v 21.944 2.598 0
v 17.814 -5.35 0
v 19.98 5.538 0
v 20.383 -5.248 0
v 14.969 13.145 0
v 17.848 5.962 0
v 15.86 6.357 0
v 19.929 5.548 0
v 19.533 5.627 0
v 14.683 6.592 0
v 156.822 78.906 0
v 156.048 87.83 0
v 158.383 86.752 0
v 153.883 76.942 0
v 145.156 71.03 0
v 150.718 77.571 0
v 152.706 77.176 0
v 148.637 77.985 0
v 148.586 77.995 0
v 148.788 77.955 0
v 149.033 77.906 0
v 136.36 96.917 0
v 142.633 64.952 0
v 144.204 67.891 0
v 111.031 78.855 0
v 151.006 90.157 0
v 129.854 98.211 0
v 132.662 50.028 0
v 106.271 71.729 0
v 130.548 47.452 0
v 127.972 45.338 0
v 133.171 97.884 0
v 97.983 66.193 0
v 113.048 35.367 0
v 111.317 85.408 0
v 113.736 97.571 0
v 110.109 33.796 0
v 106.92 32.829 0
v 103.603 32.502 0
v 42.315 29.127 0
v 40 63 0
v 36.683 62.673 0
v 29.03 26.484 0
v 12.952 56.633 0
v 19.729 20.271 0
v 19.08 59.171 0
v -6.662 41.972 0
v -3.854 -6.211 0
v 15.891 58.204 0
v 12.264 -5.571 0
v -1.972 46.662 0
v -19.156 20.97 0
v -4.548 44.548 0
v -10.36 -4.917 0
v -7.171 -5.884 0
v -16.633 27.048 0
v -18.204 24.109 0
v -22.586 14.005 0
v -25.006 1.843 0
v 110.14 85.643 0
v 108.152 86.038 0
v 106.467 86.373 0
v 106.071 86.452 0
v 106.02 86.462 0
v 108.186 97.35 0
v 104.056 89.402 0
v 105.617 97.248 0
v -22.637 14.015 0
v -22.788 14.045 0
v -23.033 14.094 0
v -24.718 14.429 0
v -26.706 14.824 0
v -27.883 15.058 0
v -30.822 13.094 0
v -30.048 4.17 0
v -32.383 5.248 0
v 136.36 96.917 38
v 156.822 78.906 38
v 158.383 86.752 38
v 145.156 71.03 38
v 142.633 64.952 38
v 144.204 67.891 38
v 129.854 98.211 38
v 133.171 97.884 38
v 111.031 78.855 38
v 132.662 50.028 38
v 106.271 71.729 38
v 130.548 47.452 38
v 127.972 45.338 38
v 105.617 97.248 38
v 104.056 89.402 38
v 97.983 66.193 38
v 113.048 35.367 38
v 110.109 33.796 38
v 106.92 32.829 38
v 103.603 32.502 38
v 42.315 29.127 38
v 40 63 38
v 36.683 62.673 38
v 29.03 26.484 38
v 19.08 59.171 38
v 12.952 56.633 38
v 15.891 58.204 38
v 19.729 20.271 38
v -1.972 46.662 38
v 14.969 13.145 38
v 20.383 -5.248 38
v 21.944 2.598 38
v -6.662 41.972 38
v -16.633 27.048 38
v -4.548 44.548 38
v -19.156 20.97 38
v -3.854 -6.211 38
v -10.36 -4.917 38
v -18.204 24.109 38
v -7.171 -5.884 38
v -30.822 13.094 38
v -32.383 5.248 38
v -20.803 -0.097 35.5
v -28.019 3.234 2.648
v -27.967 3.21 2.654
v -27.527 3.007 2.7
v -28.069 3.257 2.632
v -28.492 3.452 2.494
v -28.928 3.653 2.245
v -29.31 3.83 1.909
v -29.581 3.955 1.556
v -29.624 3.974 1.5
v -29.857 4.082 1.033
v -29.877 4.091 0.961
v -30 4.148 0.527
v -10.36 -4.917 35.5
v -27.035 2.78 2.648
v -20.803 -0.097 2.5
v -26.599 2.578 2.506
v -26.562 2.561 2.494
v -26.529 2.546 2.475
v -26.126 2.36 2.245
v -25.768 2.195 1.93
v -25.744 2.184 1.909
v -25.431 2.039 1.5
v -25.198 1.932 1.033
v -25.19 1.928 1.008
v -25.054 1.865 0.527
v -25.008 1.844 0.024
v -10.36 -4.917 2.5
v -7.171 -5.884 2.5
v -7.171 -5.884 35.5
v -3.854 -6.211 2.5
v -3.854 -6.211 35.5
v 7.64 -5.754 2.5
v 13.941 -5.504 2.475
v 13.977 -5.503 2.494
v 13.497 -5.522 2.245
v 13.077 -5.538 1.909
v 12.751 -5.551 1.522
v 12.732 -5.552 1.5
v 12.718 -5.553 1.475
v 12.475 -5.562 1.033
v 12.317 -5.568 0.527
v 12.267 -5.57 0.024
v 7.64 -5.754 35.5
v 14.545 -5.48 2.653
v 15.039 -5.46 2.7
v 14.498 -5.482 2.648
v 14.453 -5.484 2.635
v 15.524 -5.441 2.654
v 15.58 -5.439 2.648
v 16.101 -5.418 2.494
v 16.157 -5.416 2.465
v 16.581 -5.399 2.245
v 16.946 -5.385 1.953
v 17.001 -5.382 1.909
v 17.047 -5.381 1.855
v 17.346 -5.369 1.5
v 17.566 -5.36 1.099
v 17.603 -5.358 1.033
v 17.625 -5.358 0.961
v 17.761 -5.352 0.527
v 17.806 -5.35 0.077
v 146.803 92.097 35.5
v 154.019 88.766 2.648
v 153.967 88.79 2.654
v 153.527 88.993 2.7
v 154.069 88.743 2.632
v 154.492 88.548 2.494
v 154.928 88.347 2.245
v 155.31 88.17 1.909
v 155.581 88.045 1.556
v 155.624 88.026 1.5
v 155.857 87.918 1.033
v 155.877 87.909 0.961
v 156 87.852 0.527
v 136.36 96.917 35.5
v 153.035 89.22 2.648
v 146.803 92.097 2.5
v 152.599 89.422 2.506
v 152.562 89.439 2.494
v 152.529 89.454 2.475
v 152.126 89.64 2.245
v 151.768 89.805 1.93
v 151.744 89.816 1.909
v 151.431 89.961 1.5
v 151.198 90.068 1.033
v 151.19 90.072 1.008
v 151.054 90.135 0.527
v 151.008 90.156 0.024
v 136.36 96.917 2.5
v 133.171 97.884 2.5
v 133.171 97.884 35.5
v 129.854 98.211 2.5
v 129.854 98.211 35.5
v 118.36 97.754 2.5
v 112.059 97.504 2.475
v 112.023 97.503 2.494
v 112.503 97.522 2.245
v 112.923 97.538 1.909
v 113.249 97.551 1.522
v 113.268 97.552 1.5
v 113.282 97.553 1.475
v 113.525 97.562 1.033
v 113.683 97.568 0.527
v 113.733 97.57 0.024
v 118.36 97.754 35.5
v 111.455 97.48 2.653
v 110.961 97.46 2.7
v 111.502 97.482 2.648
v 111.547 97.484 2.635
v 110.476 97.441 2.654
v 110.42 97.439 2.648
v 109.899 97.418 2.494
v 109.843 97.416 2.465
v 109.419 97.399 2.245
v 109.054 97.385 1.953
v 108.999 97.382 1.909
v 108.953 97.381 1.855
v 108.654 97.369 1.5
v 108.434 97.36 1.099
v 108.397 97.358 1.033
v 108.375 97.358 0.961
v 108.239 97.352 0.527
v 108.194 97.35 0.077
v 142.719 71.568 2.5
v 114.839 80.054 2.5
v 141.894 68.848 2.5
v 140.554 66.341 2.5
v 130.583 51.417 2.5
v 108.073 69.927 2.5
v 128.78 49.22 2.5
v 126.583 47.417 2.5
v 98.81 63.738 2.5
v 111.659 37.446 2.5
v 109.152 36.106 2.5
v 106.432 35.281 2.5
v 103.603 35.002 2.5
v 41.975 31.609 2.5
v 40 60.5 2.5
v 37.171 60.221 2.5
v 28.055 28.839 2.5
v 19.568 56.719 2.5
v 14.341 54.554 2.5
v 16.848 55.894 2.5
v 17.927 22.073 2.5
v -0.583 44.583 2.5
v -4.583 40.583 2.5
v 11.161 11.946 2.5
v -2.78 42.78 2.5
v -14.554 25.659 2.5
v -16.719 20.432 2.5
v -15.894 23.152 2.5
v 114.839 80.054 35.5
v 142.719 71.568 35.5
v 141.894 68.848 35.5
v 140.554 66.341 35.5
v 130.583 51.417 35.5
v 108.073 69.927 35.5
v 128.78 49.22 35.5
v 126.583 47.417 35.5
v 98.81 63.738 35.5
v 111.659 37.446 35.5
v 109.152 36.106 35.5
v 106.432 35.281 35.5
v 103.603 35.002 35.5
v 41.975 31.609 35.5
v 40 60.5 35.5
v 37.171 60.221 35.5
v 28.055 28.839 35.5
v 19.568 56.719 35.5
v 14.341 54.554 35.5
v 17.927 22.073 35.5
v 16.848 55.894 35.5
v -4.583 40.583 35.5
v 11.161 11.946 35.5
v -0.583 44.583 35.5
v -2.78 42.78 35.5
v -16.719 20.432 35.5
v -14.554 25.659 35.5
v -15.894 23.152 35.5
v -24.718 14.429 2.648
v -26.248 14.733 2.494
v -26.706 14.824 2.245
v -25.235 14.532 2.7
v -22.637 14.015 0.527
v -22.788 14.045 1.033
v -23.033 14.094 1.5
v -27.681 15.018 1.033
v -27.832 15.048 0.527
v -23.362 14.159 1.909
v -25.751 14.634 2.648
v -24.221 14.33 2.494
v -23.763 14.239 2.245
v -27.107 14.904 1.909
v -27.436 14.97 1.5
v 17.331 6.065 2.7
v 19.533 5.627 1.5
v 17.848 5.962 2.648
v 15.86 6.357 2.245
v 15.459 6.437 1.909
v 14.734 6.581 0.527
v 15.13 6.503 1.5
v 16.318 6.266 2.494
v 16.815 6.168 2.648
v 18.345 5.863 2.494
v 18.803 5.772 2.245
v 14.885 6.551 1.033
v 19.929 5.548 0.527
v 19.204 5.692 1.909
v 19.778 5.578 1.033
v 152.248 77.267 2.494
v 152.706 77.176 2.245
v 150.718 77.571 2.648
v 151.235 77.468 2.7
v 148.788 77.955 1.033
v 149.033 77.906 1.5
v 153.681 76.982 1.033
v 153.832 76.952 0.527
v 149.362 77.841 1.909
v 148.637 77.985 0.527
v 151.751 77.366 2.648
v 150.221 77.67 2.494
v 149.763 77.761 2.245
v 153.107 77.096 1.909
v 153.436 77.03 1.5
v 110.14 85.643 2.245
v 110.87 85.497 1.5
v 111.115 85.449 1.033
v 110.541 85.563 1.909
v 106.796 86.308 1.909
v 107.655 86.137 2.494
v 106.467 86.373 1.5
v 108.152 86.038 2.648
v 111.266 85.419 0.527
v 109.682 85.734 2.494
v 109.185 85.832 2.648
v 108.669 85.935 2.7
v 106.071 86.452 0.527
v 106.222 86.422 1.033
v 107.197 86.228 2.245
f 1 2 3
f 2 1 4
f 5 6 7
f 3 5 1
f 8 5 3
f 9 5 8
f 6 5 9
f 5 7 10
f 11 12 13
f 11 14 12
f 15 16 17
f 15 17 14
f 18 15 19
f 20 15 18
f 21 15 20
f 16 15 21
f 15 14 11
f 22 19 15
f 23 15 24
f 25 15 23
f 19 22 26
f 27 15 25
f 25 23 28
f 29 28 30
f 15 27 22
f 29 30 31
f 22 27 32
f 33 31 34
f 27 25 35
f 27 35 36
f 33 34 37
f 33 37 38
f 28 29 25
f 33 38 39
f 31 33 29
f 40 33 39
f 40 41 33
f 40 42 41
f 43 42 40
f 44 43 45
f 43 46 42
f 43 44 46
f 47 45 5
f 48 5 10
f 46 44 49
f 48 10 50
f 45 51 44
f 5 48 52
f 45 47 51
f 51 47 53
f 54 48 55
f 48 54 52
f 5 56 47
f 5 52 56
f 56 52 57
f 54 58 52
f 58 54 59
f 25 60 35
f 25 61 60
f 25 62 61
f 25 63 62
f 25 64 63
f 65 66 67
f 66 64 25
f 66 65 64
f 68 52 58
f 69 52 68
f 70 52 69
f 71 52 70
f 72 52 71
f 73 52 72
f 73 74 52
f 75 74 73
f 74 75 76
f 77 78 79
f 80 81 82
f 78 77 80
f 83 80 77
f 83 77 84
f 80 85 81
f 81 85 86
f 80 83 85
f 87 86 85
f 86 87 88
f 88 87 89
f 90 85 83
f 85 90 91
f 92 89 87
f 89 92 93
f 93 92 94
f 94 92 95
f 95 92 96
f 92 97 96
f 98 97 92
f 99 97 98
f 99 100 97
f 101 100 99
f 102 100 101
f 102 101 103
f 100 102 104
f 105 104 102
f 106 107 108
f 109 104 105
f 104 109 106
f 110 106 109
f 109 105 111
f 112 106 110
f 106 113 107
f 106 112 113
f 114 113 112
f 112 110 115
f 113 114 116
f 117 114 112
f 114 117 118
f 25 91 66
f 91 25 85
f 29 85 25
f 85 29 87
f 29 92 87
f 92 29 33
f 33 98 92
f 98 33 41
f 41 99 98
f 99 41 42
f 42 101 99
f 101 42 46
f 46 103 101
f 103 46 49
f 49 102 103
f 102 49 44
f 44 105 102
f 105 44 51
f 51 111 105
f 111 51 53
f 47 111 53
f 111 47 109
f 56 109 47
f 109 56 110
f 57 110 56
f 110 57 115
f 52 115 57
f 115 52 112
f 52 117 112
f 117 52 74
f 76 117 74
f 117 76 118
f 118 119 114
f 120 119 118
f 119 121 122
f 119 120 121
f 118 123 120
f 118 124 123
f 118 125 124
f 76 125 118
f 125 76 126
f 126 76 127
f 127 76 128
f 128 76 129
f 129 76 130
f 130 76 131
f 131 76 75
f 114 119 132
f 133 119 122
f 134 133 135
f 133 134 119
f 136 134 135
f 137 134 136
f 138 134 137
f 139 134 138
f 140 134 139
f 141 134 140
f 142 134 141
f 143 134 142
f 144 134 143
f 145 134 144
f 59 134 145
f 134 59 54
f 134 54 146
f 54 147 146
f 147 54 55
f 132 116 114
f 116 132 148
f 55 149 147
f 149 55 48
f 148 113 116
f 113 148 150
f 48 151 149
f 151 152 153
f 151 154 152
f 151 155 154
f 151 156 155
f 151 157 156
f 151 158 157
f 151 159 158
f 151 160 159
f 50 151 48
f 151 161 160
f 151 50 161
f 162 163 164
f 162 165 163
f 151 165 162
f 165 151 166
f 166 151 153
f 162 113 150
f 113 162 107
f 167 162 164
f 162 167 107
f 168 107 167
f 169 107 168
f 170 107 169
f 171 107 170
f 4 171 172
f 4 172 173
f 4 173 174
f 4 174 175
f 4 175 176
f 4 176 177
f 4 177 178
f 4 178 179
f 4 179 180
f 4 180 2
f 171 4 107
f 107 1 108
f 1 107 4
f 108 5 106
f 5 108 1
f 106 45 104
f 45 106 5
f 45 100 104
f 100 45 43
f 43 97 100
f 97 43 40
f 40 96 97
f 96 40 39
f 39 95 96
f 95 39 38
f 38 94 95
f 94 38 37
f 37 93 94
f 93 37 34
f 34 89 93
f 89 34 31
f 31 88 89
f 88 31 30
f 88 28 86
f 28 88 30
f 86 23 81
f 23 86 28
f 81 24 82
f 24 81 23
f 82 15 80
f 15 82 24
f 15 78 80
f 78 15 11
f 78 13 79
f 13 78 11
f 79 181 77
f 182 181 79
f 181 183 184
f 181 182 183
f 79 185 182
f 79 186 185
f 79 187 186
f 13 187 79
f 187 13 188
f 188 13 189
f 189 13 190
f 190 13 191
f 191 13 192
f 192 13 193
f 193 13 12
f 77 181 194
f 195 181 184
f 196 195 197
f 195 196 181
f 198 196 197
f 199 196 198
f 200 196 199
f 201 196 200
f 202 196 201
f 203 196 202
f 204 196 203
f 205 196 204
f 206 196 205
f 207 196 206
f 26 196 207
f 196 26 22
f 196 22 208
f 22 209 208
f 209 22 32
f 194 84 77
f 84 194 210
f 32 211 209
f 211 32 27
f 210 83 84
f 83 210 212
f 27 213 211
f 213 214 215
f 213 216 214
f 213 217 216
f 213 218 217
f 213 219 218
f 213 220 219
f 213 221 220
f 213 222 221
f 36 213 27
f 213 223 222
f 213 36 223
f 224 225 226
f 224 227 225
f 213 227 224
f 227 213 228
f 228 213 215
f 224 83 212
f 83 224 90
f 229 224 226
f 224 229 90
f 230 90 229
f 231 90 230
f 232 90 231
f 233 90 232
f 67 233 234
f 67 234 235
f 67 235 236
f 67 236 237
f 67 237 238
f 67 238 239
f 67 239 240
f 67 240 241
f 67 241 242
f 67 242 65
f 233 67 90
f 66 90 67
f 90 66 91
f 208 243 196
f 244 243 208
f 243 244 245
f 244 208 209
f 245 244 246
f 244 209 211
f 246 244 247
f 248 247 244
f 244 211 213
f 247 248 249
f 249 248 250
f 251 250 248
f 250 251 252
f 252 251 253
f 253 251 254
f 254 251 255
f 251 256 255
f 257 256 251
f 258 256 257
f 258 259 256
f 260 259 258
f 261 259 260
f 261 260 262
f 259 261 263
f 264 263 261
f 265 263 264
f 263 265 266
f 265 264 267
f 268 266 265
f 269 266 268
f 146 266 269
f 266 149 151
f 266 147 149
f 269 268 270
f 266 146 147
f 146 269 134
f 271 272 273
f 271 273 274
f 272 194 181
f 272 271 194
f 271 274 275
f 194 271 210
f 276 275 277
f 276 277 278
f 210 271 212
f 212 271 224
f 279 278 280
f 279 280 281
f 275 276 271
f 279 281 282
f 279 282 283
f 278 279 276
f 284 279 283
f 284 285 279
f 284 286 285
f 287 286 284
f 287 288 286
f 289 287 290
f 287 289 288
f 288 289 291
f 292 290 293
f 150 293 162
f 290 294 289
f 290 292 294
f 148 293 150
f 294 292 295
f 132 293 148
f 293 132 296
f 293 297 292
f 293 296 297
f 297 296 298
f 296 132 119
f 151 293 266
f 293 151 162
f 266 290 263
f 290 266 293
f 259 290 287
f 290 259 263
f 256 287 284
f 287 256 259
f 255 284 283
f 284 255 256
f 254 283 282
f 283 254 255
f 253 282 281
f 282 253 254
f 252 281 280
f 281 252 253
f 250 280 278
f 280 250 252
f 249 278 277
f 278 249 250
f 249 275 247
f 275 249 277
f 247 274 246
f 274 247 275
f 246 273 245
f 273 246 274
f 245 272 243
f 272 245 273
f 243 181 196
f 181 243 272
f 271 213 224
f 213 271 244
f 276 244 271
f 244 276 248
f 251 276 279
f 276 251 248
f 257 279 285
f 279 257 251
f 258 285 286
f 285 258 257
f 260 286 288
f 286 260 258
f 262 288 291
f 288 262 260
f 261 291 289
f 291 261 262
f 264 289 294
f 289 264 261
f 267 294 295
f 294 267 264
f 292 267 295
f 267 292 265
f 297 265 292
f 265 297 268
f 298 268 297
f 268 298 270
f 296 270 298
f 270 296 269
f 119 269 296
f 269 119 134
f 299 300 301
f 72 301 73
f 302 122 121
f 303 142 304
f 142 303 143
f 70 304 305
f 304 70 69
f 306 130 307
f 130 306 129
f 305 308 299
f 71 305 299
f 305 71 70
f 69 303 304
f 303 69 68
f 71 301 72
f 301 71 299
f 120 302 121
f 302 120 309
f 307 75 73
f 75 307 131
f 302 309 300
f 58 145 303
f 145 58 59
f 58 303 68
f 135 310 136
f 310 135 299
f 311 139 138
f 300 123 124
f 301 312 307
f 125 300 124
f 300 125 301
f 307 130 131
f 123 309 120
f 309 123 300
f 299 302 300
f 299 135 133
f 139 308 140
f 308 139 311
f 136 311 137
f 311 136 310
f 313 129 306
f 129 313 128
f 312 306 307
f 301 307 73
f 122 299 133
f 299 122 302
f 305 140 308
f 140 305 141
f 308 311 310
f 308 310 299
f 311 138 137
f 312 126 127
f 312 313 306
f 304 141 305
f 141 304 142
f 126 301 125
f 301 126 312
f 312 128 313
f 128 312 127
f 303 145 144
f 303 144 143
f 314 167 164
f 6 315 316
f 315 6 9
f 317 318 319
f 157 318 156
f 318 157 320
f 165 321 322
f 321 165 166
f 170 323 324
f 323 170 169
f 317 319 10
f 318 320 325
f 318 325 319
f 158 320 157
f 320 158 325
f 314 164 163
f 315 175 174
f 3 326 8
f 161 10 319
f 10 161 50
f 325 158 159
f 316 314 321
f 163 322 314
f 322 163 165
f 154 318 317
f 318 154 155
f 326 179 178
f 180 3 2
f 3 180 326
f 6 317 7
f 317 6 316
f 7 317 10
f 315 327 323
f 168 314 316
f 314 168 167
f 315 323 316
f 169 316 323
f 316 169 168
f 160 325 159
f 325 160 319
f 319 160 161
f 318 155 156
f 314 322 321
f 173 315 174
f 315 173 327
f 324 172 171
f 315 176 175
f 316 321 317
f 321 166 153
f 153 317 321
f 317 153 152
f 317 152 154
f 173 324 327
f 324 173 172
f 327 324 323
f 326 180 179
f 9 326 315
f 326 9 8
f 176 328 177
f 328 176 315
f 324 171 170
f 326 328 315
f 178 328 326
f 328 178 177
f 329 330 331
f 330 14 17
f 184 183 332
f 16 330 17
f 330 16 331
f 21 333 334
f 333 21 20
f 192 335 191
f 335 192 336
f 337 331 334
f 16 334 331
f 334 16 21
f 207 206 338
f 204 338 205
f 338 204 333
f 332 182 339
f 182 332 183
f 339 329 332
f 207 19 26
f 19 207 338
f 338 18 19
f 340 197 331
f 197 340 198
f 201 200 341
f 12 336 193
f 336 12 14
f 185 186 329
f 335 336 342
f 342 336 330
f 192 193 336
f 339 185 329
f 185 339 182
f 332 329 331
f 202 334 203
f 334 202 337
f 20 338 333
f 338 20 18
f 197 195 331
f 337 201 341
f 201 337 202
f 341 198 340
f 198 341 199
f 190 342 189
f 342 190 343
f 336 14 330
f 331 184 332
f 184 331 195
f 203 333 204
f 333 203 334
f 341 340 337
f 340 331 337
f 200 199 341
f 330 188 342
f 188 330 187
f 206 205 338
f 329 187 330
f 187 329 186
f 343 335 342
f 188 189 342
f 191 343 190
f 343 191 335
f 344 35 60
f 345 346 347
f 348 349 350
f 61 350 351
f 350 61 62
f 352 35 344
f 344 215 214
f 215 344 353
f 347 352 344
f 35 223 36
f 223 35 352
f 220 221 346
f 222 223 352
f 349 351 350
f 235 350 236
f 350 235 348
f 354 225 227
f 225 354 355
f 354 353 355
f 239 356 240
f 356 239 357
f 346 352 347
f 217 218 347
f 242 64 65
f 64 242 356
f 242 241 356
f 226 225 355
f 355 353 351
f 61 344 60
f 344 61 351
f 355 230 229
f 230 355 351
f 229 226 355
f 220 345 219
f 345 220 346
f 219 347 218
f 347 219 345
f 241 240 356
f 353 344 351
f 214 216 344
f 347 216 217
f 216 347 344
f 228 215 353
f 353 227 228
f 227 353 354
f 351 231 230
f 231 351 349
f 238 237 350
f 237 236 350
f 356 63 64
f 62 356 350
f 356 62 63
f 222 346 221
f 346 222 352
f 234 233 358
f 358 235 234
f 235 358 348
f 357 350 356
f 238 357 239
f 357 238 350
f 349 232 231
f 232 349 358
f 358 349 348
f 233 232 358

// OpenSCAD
$fn = 32;

// ----------------------------------------------------------------------
// Air duct: 34 mm duct, 2.5 mm wall, 38 mm across
// ----------------------------------------------------------------------

// --- parameters (mm) ---
duct_r = 17;              // duct core radius
duct_d = 34;              // duct core diameter
wall = 2.5;               // duct wall thickness
height = 38;              // duct width (extrusion height)
port_r = 26.9;            // port flange half width
port_d = 53.8;            // port flange width
port_t = 8;               // port flange thickness
bolt_d = 5.4;             // port bolt holes
bolt_offset = 21.7;       // bolt hole offset from the port axis

difference() {
  /* outer hull chain: tube with a flat flange plate at every port */
  linear_extrude(height = 38) {
    hull() {
      polygon([[20.383, -5.248], [-32.383, 5.248], [-30.822, 13.094], [21.944, 2.598]]);
      translate([-3.854, 10.789]) circle(r = 17);
    }
    hull() {
      translate([-3.854, 10.789]) circle(r = 17);
      translate([-2.498, 17.603]) circle(r = 17);
    }
    hull() {
      translate([-2.498, 17.603]) circle(r = 17);
      translate([7.473, 32.527]) circle(r = 17);
    }
    hull() {
      translate([7.473, 32.527]) circle(r = 17);
      translate([22.397, 42.498]) circle(r = 17);
    }
    hull() {
      translate([22.397, 42.498]) circle(r = 17);
      translate([40, 46]) circle(r = 17);
    }
    hull() {
      translate([40, 46]) circle(r = 17);
      translate([103.603, 49.502]) circle(r = 17);
    }
    hull() {
      translate([103.603, 49.502]) circle(r = 17);
      translate([118.527, 59.473]) circle(r = 17);
    }
    hull() {
      translate([118.527, 59.473]) circle(r = 17);
      translate([128.498, 74.397]) circle(r = 17);
    }
    hull() {
      translate([128.498, 74.397]) circle(r = 17);
      translate([129.854, 81.211]) circle(r = 17);
    }
    hull() {
      translate([129.854, 81.211]) circle(r = 17);
      polygon([[105.617, 97.248], [158.383, 86.752], [156.822, 78.906], [104.056, 89.402]]);
    }
  }
  /* air passage: the same chain inset by the wall, 5 mm proud of the ports */
  translate([0, 0, 2.5]) linear_extrude(height = 33) {
    hull() {
      translate([-6.975, -4.904]) circle(r = 14.5);
      translate([-2.498, 17.603]) circle(r = 14.5);
    }
    hull() {
      translate([-2.498, 17.603]) circle(r = 14.5);
      translate([7.473, 32.527]) circle(r = 14.5);
    }
    hull() {
      translate([7.473, 32.527]) circle(r = 14.5);
      translate([22.397, 42.498]) circle(r = 14.5);
    }
    hull() {
      translate([22.397, 42.498]) circle(r = 14.5);
      translate([40, 46]) circle(r = 14.5);
    }
    hull() {
      translate([40, 46]) circle(r = 14.5);
      translate([103.603, 49.502]) circle(r = 14.5);
    }
    hull() {
      translate([103.603, 49.502]) circle(r = 14.5);
      translate([118.527, 59.473]) circle(r = 14.5);
    }
    hull() {
      translate([118.527, 59.473]) circle(r = 14.5);
      translate([128.498, 74.397]) circle(r = 14.5);
    }
    hull() {
      translate([128.498, 74.397]) circle(r = 14.5);
      translate([132.975, 96.904]) circle(r = 14.5);
    }
  }
  translate([-6, 0]) rotate([0, 0, -11.25]) translate([-21.7, -2.5]) rotate([-90, 0, 0]) cylinder(h = 13, d = 5.4);
  translate([-6, 0]) rotate([0, 0, -11.25]) translate([21.7, -2.5]) rotate([-90, 0, 0]) cylinder(h = 13, d = 5.4);
  translate([132, 92]) rotate([0, 0, 168.75]) translate([-21.7, -2.5]) rotate([-90, 0, 0]) cylinder(h = 13, d = 5.4);
  translate([132, 92]) rotate([0, 0, 168.75]) translate([21.7, -2.5]) rotate([-90, 0, 0]) cylinder(h = 13, d = 5.4);
}
